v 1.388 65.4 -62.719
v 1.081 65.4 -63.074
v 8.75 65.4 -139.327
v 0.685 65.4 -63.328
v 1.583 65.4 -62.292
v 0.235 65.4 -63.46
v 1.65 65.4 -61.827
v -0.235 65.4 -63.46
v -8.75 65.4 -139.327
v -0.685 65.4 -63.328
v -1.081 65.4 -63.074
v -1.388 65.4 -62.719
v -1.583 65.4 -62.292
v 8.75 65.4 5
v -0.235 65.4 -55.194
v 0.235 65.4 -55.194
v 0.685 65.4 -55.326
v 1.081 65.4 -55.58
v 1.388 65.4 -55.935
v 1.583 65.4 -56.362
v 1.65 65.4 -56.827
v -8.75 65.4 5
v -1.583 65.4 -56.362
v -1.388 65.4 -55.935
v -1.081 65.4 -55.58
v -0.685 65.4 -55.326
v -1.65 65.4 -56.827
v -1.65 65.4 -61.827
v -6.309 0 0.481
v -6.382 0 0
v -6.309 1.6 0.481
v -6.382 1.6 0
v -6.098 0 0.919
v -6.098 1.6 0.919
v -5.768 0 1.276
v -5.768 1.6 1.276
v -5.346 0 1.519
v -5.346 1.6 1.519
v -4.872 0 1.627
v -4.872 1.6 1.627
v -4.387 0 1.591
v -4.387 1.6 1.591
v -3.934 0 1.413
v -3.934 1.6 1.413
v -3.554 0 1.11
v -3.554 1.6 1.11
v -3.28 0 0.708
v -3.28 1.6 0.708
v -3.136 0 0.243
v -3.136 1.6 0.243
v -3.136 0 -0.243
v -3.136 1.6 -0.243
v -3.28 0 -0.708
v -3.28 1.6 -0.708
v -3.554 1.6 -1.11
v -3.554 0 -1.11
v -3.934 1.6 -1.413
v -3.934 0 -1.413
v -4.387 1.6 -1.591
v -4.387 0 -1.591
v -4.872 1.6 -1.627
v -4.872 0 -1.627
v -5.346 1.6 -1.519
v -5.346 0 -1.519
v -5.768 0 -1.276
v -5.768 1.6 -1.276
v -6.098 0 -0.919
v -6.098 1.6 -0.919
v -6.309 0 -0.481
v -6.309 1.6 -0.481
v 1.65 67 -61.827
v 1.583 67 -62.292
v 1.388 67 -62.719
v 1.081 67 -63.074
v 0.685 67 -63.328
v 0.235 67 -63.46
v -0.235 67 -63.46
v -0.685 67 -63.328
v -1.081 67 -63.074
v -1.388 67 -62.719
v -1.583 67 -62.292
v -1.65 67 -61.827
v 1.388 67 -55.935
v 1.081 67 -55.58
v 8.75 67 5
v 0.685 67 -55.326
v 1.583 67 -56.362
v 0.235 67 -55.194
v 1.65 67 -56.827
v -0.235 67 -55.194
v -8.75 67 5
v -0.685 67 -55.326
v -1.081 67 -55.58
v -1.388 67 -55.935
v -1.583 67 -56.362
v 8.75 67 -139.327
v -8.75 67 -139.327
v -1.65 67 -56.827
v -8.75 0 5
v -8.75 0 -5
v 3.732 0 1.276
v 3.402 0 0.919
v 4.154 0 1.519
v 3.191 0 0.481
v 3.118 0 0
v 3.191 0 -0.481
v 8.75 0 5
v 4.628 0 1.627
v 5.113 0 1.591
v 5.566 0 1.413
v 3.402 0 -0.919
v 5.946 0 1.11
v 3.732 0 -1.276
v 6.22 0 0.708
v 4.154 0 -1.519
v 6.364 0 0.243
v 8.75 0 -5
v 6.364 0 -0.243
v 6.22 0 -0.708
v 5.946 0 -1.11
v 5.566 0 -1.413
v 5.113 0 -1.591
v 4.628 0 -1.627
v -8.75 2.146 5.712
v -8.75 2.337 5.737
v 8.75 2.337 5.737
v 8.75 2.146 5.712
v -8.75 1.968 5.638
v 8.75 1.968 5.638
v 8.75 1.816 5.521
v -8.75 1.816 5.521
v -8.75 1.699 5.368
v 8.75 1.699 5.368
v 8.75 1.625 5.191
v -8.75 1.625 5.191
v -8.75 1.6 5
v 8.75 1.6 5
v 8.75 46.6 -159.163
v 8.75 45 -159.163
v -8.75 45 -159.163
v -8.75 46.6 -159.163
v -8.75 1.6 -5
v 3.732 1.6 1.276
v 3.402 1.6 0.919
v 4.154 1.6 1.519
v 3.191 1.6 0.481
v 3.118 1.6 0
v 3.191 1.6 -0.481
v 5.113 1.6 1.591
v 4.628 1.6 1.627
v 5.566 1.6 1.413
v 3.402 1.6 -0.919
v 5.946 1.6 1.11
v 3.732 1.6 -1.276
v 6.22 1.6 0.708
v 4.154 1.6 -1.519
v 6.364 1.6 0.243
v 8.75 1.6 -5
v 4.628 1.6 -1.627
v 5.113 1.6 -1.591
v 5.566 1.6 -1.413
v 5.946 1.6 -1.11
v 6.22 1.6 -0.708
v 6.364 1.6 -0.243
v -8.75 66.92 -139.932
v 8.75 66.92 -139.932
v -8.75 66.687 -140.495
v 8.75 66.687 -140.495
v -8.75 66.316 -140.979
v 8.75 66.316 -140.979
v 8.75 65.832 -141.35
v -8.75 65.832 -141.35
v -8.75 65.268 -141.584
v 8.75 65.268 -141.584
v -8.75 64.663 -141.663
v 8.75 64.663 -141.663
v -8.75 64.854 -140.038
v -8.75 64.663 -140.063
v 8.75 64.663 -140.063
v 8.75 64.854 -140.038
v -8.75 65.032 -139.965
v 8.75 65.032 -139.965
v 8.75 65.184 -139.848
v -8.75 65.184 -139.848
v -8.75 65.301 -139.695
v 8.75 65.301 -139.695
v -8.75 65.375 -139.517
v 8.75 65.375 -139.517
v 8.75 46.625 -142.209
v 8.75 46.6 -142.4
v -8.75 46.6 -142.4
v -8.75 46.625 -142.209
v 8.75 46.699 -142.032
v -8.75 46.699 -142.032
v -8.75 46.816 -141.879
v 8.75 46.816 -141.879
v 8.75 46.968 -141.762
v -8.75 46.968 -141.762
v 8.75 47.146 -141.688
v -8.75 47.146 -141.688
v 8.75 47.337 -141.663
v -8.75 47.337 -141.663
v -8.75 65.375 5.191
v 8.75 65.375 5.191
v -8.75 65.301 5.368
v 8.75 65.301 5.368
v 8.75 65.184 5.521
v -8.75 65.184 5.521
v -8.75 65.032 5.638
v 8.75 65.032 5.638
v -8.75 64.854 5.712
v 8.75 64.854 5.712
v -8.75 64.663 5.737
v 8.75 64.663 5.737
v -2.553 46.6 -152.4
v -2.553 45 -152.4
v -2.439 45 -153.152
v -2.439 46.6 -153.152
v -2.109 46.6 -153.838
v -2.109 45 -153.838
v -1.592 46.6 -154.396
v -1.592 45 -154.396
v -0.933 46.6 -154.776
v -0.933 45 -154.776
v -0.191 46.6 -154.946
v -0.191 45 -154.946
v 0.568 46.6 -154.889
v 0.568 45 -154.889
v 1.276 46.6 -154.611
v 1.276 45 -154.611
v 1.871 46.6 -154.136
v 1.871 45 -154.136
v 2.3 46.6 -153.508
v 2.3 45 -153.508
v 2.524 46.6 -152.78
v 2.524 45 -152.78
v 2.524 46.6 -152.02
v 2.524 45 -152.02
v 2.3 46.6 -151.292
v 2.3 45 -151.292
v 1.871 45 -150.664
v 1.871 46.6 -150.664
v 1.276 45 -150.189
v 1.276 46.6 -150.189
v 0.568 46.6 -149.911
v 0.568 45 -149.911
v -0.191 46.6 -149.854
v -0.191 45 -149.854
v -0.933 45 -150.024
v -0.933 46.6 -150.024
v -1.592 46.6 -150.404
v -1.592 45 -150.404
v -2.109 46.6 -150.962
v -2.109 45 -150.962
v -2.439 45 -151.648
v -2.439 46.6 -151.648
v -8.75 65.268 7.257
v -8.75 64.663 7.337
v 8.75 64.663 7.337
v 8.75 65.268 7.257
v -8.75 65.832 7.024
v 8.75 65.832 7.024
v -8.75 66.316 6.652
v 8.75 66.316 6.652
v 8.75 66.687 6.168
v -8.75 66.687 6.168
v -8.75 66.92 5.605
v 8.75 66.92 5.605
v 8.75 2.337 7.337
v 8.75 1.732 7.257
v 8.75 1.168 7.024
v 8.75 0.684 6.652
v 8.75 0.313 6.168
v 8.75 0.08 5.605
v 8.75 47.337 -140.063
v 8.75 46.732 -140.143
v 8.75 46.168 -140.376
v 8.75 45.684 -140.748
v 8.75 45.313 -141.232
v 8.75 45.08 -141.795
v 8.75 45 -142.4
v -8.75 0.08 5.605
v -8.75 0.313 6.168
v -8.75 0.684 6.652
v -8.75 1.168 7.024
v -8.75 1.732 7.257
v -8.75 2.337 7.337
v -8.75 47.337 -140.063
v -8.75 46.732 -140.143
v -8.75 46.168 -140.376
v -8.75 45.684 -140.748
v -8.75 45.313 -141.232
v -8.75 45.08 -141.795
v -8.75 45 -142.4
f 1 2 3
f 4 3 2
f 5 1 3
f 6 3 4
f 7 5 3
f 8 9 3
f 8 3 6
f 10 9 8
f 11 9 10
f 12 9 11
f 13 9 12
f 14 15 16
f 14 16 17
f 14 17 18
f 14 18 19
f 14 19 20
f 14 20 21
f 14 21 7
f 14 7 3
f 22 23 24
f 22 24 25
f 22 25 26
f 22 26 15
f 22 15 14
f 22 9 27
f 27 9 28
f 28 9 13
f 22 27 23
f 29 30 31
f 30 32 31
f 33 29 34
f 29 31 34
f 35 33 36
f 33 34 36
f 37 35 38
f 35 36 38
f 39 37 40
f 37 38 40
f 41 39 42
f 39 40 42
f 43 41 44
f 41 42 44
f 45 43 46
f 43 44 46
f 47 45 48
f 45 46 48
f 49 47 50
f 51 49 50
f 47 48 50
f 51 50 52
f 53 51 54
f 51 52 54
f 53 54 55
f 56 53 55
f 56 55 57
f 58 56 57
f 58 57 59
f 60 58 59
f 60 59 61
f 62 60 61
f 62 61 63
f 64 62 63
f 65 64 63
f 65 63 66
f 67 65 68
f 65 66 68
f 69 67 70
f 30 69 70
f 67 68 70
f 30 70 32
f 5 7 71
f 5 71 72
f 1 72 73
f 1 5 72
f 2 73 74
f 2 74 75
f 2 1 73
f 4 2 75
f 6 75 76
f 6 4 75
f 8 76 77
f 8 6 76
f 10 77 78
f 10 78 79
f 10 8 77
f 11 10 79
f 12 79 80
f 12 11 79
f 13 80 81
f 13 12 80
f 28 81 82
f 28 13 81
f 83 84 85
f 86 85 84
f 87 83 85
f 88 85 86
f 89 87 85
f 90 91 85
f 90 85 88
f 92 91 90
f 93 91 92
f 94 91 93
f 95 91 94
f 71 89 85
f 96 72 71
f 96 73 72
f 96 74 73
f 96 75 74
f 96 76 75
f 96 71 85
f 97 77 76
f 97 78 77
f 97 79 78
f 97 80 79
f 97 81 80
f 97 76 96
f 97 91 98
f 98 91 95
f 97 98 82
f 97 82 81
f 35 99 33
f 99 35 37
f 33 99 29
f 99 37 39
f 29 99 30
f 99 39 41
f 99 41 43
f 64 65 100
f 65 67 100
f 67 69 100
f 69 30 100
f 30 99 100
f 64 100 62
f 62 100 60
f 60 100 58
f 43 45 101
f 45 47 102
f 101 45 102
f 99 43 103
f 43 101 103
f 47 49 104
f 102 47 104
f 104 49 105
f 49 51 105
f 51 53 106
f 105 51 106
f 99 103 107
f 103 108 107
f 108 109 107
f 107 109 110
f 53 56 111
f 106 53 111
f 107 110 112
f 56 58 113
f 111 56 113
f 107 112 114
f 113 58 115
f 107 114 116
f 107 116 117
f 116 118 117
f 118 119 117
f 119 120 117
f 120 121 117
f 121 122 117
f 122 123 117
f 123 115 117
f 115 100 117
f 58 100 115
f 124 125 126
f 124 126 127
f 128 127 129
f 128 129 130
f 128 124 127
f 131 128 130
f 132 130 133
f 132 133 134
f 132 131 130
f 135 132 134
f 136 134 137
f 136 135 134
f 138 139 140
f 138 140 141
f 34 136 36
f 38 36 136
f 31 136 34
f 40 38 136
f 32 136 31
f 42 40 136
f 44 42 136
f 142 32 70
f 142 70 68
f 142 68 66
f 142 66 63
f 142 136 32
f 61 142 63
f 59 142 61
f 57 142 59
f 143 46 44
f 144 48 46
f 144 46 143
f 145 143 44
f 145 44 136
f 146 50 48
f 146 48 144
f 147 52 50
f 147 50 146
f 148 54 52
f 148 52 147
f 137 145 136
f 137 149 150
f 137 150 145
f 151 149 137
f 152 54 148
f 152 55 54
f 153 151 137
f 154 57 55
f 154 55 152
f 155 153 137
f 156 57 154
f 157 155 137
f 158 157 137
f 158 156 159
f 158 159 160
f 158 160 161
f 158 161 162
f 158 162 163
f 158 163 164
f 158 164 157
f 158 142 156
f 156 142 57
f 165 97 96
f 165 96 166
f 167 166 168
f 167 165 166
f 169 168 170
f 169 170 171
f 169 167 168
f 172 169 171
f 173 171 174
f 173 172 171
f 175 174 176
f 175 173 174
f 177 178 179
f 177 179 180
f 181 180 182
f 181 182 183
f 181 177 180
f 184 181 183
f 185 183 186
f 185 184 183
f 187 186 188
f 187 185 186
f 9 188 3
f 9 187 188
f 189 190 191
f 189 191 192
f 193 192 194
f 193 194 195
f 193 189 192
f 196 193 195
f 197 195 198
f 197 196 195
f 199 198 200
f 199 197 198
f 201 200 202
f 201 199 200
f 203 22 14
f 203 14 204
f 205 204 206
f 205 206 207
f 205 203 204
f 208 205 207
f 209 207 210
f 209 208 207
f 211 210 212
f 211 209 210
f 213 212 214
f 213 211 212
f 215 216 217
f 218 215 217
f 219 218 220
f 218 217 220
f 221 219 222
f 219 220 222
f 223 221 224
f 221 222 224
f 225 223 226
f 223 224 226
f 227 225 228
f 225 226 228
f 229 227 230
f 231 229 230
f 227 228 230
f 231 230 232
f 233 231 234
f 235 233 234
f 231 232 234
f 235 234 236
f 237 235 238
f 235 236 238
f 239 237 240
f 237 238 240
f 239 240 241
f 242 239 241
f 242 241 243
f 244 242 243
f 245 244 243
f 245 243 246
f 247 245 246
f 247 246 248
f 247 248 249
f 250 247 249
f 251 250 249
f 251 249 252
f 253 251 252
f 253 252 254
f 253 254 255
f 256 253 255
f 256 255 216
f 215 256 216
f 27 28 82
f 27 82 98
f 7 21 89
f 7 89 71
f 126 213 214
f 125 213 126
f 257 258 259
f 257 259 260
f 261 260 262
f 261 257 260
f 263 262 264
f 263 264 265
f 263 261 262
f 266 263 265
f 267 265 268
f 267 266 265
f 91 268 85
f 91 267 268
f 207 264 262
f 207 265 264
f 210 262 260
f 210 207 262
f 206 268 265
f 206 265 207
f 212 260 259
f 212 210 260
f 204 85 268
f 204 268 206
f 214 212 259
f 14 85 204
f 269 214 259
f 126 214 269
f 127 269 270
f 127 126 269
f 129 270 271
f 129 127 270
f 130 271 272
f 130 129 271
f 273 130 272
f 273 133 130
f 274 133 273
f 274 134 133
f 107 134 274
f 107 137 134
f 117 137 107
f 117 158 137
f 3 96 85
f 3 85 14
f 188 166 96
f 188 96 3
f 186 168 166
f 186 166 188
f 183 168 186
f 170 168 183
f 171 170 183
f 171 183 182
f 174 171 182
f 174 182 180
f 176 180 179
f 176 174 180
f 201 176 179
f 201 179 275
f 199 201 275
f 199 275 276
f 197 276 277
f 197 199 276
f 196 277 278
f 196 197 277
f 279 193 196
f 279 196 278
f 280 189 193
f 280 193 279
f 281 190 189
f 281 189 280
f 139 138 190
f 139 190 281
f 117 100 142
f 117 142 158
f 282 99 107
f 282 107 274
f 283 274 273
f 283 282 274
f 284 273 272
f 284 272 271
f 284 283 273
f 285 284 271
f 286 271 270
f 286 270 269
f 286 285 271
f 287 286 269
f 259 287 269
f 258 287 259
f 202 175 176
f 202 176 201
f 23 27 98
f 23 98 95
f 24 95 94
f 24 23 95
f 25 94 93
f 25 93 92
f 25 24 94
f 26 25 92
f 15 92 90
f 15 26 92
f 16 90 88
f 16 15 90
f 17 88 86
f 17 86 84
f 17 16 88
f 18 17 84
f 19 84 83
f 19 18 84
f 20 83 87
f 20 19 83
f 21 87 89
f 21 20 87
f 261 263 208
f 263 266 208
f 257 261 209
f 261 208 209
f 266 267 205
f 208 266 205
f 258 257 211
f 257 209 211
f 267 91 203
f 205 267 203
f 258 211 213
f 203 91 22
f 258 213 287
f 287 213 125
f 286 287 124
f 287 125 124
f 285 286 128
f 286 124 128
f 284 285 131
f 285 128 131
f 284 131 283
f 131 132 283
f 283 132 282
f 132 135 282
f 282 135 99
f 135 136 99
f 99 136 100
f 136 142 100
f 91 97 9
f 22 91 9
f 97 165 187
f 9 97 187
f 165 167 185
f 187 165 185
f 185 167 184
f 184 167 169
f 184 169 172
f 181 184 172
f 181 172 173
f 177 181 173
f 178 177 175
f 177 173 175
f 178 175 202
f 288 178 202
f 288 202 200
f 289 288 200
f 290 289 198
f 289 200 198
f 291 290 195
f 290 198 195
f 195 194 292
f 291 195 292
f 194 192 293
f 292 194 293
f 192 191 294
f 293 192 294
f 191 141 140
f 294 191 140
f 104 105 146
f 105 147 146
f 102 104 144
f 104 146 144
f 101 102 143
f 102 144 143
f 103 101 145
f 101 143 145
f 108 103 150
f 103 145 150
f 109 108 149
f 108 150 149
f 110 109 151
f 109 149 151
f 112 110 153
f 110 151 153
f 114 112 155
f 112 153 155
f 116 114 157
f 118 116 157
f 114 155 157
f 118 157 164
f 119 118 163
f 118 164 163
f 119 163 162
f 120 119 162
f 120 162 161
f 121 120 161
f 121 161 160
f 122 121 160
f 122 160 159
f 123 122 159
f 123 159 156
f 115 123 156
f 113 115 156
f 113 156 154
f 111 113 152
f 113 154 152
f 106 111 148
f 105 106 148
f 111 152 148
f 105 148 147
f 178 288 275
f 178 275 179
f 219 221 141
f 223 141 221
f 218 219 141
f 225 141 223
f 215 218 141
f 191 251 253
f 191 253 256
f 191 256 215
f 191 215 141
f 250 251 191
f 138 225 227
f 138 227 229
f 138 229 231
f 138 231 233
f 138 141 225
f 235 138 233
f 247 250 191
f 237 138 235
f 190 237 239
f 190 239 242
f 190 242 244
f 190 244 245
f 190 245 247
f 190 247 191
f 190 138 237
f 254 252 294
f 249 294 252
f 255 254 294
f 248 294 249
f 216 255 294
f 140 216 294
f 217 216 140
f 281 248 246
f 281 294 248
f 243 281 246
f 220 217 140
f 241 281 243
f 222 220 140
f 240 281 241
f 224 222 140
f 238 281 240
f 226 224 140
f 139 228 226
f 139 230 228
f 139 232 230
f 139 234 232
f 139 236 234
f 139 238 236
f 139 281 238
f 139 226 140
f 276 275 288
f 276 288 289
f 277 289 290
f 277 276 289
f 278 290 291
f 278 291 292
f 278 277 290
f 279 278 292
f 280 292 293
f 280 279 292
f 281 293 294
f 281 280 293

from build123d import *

# Parameters (mm, degrees)
SKETCH1_W                    = 17.5
SKETCH1_H                    = 10
BASE_FLANGE1_DEPTH           = 1.6
EDGE_FLANGE1_DEPTH           = 17.5
EDGE_FLANGE2_STRIP_W         = 7.8732
EDGE_FLANGE2_STRIP_H         = 1.6
EDGE_FLANGE2_STRIP_CUT_DEPTH = 17.5
EDGE_FLANGE2_DEPTH           = 17.5
EDGE_FLANGE3_STRIP_W         = 7.8732
EDGE_FLANGE3_STRIP_H         = 1.6
EDGE_FLANGE3_STRIP_CUT_DEPTH = 17.5
EDGE_FLANGE3_DEPTH           = 17.5
F_4_CLEARANCE_HOLE1_D        = 3.2639
F_4_CLEARANCE_HOLE1_DEPTH    = 1.6
F_4_CLEARANCE_HOLE1_TIP      = 0.980574487
CUT_EXTRUDE3_DEPTH           = 1.6
EDGE_FLANGE4_STRIP_W         = 7.8732
EDGE_FLANGE4_STRIP_H         = 1.6
EDGE_FLANGE4_STRIP_CUT_DEPTH = 17.5
EDGE_FLANGE4_DEPTH           = 17.5
F_10_CLEARANCE_HOLE1_D       = 5.1054
F_10_CLEARANCE_HOLE1_DEPTH   = 7.6
F_10_CLEARANCE_HOLE1_TIP     = 1.533816902


# Sheet-metal steps are written as plain solids
with BuildPart() as part:
    # Sketch1 → Base-Flange1 (new body)
    with BuildSketch(Plane(origin=(0, 0, 0), x_dir=(1, 0, 0), z_dir=(0, 1, 0))):
        Rectangle(SKETCH1_W, SKETCH1_H)
    extrude(amount=BASE_FLANGE1_DEPTH)

    # Edge-Flange1 section (across the edge) → Edge-Flange1 (add)
    with BuildSketch(Plane(origin=(-8.75, 1.6, 5.7366), x_dir=(0, 0, -1), z_dir=(1, 0, 0))):
        with BuildLine():
            Line((-1.6, 0.7366), (-1.6, 65.4))
            Line((-1.6, 65.4), (0, 65.4))
            Line((0, 65.4), (0, 0.7366))
            ThreePointArc((0, 0.7366), (0.215745145, 0.215745145), (0.7366, 0))
            Line((0.7366, 0), (0.7366, -1.6))
            ThreePointArc((0.7366, -1.6), (-0.915625705, -0.915625705), (-1.6, 0.7366))
        make_face()
    extrude(amount=EDGE_FLANGE1_DEPTH)

    # Edge-Flange2 strip (across the edge) → Edge-Flange2 strip cut (cut)
    with BuildSketch(Plane(origin=(-8.75, 67, 5.7366), x_dir=(0, -1, 0), z_dir=(1, 0, 0))):
        with Locations((-1.6, -0.8)):
            Rectangle(EDGE_FLANGE2_STRIP_W, EDGE_FLANGE2_STRIP_H)
    extrude(amount=EDGE_FLANGE2_STRIP_CUT_DEPTH, mode=Mode.SUBTRACT)

    # Edge-Flange2 section (across the edge) → Edge-Flange2 (add)
    with BuildSketch(Plane(origin=(-8.75, 67, 5.7366), x_dir=(0, -1, 0), z_dir=(1, 0, 0))):
        with BuildLine():
            Line((0, 0.7366), (0, 147.4))
            Line((0, 147.4), (1.6, 147.4))
            Line((1.6, 147.4), (1.6, 0.7366))
            ThreePointArc((1.6, 0.7366), (1.815745145, 0.215745145), (2.3366, 0))
            Line((2.3366, 0), (2.3366, -1.6))
            ThreePointArc((2.3366, -1.6), (0.684374295, -0.915625705), (0, 0.7366))
        make_face()
    extrude(amount=EDGE_FLANGE2_DEPTH)

    # Edge-Flange3 strip (across the edge) → Edge-Flange3 strip cut (cut)
    with BuildSketch(Plane(origin=(-8.75, 65.4, -141.6634), x_dir=(0, 0, 1), z_dir=(1, 0, 0))):
        with Locations((-1.6, -0.8)):
            Rectangle(EDGE_FLANGE3_STRIP_W, EDGE_FLANGE3_STRIP_H)
    extrude(amount=EDGE_FLANGE3_STRIP_CUT_DEPTH, mode=Mode.SUBTRACT)

    # Edge-Flange3 section (across the edge) → Edge-Flange3 (add)
    with BuildSketch(Plane(origin=(-8.75, 65.4, -141.6634), x_dir=(0, 0, 1), z_dir=(1, 0, 0))):
        with BuildLine():
            Line((0, 0.7366), (0, 20.4))
            Line((0, 20.4), (1.6, 20.4))
            Line((1.6, 20.4), (1.6, 0.7366))
            ThreePointArc((1.6, 0.7366), (1.815745145, 0.215745145), (2.3366, 0))
            Line((2.3366, 0), (2.3366, -1.6))
            ThreePointArc((2.3366, -1.6), (0.684374295, -0.915625705), (0, 0.7366))
        make_face()
    extrude(amount=EDGE_FLANGE3_DEPTH)

    # #4 Clearance Hole1
    with Locations(Plane.XZ):
        with Locations((4.75, 0), (-4.75, 0)):
            Hole(F_4_CLEARANCE_HOLE1_D / 2, depth=F_4_CLEARANCE_HOLE1_DEPTH)
            with Locations((0, 0, -(F_4_CLEARANCE_HOLE1_DEPTH + F_4_CLEARANCE_HOLE1_TIP / 2))):  # 118° drill point
                Cone(0, F_4_CLEARANCE_HOLE1_D / 2, F_4_CLEARANCE_HOLE1_TIP, mode=Mode.SUBTRACT)

    # Sketch23 → Cut-Extrude3 (cut)
    with BuildSketch(Plane.XZ.offset(-65.4)):
        with BuildLine():
            Line((-1.65, -61.8268), (-1.65, -56.8268))
            ThreePointArc((-1.65, -56.8268), (0, -55.1768), (1.65, -56.8268))
            Line((1.65, -56.8268), (1.65, -61.8268))
            ThreePointArc((1.65, -61.8268), (0, -63.4768), (-1.65, -61.8268))
        make_face()
    extrude(amount=-CUT_EXTRUDE3_DEPTH, mode=Mode.SUBTRACT)

    # Edge-Flange4 strip (across the edge) → Edge-Flange4 strip cut (cut)
    with BuildSketch(Plane(origin=(8.75, 45, -141.6634), x_dir=(0, 1, 0), z_dir=(-1, 0, 0))):
        with Locations((-1.6, -0.8)):
            Rectangle(EDGE_FLANGE4_STRIP_W, EDGE_FLANGE4_STRIP_H)
    extrude(amount=EDGE_FLANGE4_STRIP_CUT_DEPTH, mode=Mode.SUBTRACT)

    # Edge-Flange4 section (across the edge) → Edge-Flange4 (add)
    with BuildSketch(Plane(origin=(8.75, 45, -141.6634), x_dir=(0, 1, 0), z_dir=(-1, 0, 0))):
        with BuildLine():
            Line((0, 0.7366), (0, 17.5))
            Line((0, 17.5), (1.6, 17.5))
            Line((1.6, 17.5), (1.6, 0.7366))
            ThreePointArc((1.6, 0.7366), (1.815745145, 0.215745145), (2.3366, 0))
            Line((2.3366, 0), (2.3366, -1.6))
            ThreePointArc((2.3366, -1.6), (0.684374295, -0.915625705), (0, 0.7366))
        make_face()
    extrude(amount=EDGE_FLANGE4_DEPTH)

    # #10 Clearance Hole1
    with Locations(Plane(origin=(0, 46.6, 0), x_dir=(1, 0, 0), z_dir=(0, 1, 0))):
        with Locations((0, 152.4)):
            Hole(F_10_CLEARANCE_HOLE1_D / 2, depth=F_10_CLEARANCE_HOLE1_DEPTH)
            with Locations((0, 0, -(F_10_CLEARANCE_HOLE1_DEPTH + F_10_CLEARANCE_HOLE1_TIP / 2))):  # 118° drill point
                Cone(0, F_10_CLEARANCE_HOLE1_D / 2, F_10_CLEARANCE_HOLE1_TIP, mode=Mode.SUBTRACT)


solid = part.part
